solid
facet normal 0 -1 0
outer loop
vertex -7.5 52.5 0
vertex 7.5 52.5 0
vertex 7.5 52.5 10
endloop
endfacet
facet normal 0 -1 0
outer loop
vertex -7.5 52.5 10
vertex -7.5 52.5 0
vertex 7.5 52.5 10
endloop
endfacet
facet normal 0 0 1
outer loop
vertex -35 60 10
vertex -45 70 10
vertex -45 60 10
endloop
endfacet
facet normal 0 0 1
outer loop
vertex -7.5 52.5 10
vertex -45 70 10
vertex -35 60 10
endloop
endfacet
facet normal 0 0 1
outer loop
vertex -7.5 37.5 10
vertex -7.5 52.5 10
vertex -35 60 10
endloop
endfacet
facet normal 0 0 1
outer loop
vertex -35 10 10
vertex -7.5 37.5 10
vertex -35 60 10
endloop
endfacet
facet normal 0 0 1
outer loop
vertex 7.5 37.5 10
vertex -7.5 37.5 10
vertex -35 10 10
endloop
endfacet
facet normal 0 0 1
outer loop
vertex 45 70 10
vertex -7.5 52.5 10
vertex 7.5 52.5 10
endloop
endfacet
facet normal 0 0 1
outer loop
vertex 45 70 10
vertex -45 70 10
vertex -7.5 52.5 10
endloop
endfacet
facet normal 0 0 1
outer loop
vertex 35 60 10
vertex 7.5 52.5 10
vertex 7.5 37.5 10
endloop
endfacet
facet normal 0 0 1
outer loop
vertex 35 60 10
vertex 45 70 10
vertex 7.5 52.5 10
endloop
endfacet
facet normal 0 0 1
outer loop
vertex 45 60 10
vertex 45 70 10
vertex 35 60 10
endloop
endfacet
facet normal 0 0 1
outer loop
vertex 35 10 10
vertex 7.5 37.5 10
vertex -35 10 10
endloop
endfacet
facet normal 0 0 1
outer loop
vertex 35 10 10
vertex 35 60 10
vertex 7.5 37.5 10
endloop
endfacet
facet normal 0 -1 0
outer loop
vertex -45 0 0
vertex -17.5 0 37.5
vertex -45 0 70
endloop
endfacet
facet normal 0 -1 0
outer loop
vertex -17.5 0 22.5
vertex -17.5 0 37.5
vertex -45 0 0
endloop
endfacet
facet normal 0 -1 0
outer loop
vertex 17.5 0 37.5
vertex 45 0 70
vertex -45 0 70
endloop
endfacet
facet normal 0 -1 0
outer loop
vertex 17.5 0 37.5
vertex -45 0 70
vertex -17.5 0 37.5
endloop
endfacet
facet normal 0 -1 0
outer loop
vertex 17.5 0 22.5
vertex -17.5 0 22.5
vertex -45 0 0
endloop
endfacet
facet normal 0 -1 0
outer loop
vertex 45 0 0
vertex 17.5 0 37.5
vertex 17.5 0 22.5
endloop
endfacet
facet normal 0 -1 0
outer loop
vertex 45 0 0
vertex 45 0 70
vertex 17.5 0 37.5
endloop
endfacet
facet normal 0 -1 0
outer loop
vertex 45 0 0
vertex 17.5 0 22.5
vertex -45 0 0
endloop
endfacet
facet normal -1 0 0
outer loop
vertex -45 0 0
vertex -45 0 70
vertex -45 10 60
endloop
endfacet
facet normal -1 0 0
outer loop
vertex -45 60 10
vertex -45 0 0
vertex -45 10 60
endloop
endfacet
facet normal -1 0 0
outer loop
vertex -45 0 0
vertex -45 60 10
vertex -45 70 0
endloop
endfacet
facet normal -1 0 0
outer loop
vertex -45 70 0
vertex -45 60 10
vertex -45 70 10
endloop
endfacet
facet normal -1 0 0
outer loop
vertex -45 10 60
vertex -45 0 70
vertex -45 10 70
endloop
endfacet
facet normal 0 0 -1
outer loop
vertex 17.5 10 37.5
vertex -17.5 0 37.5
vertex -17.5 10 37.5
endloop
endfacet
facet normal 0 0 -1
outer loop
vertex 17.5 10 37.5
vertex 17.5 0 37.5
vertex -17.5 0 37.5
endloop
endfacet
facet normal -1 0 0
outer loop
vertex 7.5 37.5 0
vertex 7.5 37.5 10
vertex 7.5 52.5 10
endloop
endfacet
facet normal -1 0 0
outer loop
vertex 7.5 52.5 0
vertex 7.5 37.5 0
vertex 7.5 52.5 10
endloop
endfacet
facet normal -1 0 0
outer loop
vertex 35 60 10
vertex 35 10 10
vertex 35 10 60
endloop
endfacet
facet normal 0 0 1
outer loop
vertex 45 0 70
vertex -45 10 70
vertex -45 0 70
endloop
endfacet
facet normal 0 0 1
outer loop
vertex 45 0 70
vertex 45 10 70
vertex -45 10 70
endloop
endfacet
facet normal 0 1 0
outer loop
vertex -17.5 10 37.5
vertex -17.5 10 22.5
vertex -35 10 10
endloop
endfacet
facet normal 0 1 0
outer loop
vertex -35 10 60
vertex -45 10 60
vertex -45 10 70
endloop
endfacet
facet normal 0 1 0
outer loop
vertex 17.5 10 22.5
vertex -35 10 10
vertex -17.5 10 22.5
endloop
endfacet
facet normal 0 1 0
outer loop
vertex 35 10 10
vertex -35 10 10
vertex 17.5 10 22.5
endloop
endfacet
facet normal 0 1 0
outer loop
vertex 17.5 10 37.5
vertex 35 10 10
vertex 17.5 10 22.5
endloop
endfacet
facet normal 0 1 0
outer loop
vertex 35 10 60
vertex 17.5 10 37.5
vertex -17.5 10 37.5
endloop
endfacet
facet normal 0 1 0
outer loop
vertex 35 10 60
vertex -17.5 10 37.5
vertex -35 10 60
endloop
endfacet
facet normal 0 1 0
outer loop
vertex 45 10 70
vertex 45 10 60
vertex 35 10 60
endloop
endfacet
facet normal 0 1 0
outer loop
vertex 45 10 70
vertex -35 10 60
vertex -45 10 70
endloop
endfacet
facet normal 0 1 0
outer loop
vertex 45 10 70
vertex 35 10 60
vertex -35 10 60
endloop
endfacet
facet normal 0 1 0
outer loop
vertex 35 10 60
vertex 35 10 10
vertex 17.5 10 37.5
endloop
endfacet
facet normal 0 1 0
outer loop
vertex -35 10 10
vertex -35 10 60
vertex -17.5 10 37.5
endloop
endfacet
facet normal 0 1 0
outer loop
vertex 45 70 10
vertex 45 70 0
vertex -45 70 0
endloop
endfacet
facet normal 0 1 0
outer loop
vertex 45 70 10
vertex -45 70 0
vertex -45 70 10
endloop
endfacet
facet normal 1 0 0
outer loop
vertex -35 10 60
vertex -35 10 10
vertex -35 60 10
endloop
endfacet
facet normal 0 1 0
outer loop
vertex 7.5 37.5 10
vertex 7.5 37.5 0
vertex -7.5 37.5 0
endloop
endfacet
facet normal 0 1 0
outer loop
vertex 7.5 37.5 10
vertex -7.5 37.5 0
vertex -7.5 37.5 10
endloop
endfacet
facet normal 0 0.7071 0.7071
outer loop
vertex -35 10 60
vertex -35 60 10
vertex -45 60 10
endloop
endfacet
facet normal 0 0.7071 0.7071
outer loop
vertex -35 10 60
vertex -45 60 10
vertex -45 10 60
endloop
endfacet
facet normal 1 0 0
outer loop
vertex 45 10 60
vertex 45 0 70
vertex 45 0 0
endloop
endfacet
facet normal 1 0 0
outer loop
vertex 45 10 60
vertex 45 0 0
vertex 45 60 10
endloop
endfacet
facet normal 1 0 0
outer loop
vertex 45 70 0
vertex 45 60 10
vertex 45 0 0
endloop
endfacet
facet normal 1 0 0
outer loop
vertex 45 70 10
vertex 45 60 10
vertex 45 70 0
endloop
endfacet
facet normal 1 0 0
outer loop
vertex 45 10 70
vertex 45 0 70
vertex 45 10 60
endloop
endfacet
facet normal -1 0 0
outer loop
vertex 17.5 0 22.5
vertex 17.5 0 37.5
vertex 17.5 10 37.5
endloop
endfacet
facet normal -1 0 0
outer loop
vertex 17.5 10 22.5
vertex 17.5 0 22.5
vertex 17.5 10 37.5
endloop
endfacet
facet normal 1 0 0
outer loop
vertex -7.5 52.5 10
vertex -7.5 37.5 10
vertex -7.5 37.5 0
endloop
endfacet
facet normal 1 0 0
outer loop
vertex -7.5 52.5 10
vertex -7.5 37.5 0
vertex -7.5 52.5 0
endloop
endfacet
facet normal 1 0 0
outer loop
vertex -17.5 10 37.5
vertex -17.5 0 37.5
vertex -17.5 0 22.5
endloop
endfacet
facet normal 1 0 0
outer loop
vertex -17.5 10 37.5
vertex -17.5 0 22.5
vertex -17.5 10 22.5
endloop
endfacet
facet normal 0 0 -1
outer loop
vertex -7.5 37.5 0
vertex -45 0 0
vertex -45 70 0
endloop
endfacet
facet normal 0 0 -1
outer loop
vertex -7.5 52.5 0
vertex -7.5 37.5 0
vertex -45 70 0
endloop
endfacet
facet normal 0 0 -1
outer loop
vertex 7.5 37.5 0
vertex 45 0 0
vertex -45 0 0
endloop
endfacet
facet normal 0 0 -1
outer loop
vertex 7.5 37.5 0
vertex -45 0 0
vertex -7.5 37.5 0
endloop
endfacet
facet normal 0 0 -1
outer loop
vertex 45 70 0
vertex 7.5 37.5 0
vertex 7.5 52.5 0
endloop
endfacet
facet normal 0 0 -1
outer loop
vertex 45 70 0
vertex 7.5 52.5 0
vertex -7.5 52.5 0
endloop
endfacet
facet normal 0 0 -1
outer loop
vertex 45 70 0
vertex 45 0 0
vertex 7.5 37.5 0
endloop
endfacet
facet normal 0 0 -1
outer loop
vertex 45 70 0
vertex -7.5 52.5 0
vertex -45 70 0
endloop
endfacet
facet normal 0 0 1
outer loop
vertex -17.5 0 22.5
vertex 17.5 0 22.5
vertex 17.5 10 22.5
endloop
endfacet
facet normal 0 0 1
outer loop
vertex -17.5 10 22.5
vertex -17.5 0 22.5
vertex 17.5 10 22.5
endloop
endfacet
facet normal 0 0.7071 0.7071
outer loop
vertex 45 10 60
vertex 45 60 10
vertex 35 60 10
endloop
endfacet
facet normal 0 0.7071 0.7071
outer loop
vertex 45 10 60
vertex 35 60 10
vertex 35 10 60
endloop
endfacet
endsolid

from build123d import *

# Parameters (mm, degrees)
F0_W     = 10
F0_H     = 15
F0_W_2   = 15
F0_H_2   = 10
F1_DEPTH = 45
F2_DEPTH = 35
F3_DEPTH = 17.5
F4_DEPTH = 7.5


with BuildPart() as f1:
    # F0 (on Right) → F1 (new body, symmetric)
    with BuildSketch(Plane.YZ):
        Polygon((0, 70), (0, 37.5), (10, 37.5), (10, 60), (10, 70), align=None)
        with Locations((5, 30)):
            Rectangle(F0_W, F0_H)
        Polygon((0, 22.5), (0, 0), (37.5, 0), (37.5, 10), (10, 10), (10, 22.5), align=None)
        Polygon((10, 37.5), (10, 22.5), (10, 10), (37.5, 10), (52.5, 10), (60, 10), (10, 60), align=None)
        with Locations((45, 5)):
            Rectangle(F0_W_2, F0_H_2)
        Polygon((52.5, 10), (52.5, 0), (70, 0), (70, 10), (60, 10), align=None)
    extrude(amount=F1_DEPTH, both=True)

    # F0 (on Right) → F2 (cut, symmetric)
    with BuildSketch(Plane.YZ):
        Polygon((10, 37.5), (10, 22.5), (10, 10), (37.5, 10), (52.5, 10), (60, 10), (10, 60), align=None)
    extrude(amount=F2_DEPTH, both=True, mode=Mode.SUBTRACT)

    # F0 (on Right) → F3 (cut, symmetric)
    with BuildSketch(Plane.YZ):
        with Locations((5, 30)):
            Rectangle(F0_W, F0_H)
    extrude(amount=F3_DEPTH, both=True, mode=Mode.SUBTRACT)

    # F0 (on Right) → F4 (cut, symmetric)
    with BuildSketch(Plane.YZ):
        with Locations((45, 5)):
            Rectangle(F0_W_2, F0_H_2)
    extrude(amount=F4_DEPTH, both=True, mode=Mode.SUBTRACT)


solid = f1.part
